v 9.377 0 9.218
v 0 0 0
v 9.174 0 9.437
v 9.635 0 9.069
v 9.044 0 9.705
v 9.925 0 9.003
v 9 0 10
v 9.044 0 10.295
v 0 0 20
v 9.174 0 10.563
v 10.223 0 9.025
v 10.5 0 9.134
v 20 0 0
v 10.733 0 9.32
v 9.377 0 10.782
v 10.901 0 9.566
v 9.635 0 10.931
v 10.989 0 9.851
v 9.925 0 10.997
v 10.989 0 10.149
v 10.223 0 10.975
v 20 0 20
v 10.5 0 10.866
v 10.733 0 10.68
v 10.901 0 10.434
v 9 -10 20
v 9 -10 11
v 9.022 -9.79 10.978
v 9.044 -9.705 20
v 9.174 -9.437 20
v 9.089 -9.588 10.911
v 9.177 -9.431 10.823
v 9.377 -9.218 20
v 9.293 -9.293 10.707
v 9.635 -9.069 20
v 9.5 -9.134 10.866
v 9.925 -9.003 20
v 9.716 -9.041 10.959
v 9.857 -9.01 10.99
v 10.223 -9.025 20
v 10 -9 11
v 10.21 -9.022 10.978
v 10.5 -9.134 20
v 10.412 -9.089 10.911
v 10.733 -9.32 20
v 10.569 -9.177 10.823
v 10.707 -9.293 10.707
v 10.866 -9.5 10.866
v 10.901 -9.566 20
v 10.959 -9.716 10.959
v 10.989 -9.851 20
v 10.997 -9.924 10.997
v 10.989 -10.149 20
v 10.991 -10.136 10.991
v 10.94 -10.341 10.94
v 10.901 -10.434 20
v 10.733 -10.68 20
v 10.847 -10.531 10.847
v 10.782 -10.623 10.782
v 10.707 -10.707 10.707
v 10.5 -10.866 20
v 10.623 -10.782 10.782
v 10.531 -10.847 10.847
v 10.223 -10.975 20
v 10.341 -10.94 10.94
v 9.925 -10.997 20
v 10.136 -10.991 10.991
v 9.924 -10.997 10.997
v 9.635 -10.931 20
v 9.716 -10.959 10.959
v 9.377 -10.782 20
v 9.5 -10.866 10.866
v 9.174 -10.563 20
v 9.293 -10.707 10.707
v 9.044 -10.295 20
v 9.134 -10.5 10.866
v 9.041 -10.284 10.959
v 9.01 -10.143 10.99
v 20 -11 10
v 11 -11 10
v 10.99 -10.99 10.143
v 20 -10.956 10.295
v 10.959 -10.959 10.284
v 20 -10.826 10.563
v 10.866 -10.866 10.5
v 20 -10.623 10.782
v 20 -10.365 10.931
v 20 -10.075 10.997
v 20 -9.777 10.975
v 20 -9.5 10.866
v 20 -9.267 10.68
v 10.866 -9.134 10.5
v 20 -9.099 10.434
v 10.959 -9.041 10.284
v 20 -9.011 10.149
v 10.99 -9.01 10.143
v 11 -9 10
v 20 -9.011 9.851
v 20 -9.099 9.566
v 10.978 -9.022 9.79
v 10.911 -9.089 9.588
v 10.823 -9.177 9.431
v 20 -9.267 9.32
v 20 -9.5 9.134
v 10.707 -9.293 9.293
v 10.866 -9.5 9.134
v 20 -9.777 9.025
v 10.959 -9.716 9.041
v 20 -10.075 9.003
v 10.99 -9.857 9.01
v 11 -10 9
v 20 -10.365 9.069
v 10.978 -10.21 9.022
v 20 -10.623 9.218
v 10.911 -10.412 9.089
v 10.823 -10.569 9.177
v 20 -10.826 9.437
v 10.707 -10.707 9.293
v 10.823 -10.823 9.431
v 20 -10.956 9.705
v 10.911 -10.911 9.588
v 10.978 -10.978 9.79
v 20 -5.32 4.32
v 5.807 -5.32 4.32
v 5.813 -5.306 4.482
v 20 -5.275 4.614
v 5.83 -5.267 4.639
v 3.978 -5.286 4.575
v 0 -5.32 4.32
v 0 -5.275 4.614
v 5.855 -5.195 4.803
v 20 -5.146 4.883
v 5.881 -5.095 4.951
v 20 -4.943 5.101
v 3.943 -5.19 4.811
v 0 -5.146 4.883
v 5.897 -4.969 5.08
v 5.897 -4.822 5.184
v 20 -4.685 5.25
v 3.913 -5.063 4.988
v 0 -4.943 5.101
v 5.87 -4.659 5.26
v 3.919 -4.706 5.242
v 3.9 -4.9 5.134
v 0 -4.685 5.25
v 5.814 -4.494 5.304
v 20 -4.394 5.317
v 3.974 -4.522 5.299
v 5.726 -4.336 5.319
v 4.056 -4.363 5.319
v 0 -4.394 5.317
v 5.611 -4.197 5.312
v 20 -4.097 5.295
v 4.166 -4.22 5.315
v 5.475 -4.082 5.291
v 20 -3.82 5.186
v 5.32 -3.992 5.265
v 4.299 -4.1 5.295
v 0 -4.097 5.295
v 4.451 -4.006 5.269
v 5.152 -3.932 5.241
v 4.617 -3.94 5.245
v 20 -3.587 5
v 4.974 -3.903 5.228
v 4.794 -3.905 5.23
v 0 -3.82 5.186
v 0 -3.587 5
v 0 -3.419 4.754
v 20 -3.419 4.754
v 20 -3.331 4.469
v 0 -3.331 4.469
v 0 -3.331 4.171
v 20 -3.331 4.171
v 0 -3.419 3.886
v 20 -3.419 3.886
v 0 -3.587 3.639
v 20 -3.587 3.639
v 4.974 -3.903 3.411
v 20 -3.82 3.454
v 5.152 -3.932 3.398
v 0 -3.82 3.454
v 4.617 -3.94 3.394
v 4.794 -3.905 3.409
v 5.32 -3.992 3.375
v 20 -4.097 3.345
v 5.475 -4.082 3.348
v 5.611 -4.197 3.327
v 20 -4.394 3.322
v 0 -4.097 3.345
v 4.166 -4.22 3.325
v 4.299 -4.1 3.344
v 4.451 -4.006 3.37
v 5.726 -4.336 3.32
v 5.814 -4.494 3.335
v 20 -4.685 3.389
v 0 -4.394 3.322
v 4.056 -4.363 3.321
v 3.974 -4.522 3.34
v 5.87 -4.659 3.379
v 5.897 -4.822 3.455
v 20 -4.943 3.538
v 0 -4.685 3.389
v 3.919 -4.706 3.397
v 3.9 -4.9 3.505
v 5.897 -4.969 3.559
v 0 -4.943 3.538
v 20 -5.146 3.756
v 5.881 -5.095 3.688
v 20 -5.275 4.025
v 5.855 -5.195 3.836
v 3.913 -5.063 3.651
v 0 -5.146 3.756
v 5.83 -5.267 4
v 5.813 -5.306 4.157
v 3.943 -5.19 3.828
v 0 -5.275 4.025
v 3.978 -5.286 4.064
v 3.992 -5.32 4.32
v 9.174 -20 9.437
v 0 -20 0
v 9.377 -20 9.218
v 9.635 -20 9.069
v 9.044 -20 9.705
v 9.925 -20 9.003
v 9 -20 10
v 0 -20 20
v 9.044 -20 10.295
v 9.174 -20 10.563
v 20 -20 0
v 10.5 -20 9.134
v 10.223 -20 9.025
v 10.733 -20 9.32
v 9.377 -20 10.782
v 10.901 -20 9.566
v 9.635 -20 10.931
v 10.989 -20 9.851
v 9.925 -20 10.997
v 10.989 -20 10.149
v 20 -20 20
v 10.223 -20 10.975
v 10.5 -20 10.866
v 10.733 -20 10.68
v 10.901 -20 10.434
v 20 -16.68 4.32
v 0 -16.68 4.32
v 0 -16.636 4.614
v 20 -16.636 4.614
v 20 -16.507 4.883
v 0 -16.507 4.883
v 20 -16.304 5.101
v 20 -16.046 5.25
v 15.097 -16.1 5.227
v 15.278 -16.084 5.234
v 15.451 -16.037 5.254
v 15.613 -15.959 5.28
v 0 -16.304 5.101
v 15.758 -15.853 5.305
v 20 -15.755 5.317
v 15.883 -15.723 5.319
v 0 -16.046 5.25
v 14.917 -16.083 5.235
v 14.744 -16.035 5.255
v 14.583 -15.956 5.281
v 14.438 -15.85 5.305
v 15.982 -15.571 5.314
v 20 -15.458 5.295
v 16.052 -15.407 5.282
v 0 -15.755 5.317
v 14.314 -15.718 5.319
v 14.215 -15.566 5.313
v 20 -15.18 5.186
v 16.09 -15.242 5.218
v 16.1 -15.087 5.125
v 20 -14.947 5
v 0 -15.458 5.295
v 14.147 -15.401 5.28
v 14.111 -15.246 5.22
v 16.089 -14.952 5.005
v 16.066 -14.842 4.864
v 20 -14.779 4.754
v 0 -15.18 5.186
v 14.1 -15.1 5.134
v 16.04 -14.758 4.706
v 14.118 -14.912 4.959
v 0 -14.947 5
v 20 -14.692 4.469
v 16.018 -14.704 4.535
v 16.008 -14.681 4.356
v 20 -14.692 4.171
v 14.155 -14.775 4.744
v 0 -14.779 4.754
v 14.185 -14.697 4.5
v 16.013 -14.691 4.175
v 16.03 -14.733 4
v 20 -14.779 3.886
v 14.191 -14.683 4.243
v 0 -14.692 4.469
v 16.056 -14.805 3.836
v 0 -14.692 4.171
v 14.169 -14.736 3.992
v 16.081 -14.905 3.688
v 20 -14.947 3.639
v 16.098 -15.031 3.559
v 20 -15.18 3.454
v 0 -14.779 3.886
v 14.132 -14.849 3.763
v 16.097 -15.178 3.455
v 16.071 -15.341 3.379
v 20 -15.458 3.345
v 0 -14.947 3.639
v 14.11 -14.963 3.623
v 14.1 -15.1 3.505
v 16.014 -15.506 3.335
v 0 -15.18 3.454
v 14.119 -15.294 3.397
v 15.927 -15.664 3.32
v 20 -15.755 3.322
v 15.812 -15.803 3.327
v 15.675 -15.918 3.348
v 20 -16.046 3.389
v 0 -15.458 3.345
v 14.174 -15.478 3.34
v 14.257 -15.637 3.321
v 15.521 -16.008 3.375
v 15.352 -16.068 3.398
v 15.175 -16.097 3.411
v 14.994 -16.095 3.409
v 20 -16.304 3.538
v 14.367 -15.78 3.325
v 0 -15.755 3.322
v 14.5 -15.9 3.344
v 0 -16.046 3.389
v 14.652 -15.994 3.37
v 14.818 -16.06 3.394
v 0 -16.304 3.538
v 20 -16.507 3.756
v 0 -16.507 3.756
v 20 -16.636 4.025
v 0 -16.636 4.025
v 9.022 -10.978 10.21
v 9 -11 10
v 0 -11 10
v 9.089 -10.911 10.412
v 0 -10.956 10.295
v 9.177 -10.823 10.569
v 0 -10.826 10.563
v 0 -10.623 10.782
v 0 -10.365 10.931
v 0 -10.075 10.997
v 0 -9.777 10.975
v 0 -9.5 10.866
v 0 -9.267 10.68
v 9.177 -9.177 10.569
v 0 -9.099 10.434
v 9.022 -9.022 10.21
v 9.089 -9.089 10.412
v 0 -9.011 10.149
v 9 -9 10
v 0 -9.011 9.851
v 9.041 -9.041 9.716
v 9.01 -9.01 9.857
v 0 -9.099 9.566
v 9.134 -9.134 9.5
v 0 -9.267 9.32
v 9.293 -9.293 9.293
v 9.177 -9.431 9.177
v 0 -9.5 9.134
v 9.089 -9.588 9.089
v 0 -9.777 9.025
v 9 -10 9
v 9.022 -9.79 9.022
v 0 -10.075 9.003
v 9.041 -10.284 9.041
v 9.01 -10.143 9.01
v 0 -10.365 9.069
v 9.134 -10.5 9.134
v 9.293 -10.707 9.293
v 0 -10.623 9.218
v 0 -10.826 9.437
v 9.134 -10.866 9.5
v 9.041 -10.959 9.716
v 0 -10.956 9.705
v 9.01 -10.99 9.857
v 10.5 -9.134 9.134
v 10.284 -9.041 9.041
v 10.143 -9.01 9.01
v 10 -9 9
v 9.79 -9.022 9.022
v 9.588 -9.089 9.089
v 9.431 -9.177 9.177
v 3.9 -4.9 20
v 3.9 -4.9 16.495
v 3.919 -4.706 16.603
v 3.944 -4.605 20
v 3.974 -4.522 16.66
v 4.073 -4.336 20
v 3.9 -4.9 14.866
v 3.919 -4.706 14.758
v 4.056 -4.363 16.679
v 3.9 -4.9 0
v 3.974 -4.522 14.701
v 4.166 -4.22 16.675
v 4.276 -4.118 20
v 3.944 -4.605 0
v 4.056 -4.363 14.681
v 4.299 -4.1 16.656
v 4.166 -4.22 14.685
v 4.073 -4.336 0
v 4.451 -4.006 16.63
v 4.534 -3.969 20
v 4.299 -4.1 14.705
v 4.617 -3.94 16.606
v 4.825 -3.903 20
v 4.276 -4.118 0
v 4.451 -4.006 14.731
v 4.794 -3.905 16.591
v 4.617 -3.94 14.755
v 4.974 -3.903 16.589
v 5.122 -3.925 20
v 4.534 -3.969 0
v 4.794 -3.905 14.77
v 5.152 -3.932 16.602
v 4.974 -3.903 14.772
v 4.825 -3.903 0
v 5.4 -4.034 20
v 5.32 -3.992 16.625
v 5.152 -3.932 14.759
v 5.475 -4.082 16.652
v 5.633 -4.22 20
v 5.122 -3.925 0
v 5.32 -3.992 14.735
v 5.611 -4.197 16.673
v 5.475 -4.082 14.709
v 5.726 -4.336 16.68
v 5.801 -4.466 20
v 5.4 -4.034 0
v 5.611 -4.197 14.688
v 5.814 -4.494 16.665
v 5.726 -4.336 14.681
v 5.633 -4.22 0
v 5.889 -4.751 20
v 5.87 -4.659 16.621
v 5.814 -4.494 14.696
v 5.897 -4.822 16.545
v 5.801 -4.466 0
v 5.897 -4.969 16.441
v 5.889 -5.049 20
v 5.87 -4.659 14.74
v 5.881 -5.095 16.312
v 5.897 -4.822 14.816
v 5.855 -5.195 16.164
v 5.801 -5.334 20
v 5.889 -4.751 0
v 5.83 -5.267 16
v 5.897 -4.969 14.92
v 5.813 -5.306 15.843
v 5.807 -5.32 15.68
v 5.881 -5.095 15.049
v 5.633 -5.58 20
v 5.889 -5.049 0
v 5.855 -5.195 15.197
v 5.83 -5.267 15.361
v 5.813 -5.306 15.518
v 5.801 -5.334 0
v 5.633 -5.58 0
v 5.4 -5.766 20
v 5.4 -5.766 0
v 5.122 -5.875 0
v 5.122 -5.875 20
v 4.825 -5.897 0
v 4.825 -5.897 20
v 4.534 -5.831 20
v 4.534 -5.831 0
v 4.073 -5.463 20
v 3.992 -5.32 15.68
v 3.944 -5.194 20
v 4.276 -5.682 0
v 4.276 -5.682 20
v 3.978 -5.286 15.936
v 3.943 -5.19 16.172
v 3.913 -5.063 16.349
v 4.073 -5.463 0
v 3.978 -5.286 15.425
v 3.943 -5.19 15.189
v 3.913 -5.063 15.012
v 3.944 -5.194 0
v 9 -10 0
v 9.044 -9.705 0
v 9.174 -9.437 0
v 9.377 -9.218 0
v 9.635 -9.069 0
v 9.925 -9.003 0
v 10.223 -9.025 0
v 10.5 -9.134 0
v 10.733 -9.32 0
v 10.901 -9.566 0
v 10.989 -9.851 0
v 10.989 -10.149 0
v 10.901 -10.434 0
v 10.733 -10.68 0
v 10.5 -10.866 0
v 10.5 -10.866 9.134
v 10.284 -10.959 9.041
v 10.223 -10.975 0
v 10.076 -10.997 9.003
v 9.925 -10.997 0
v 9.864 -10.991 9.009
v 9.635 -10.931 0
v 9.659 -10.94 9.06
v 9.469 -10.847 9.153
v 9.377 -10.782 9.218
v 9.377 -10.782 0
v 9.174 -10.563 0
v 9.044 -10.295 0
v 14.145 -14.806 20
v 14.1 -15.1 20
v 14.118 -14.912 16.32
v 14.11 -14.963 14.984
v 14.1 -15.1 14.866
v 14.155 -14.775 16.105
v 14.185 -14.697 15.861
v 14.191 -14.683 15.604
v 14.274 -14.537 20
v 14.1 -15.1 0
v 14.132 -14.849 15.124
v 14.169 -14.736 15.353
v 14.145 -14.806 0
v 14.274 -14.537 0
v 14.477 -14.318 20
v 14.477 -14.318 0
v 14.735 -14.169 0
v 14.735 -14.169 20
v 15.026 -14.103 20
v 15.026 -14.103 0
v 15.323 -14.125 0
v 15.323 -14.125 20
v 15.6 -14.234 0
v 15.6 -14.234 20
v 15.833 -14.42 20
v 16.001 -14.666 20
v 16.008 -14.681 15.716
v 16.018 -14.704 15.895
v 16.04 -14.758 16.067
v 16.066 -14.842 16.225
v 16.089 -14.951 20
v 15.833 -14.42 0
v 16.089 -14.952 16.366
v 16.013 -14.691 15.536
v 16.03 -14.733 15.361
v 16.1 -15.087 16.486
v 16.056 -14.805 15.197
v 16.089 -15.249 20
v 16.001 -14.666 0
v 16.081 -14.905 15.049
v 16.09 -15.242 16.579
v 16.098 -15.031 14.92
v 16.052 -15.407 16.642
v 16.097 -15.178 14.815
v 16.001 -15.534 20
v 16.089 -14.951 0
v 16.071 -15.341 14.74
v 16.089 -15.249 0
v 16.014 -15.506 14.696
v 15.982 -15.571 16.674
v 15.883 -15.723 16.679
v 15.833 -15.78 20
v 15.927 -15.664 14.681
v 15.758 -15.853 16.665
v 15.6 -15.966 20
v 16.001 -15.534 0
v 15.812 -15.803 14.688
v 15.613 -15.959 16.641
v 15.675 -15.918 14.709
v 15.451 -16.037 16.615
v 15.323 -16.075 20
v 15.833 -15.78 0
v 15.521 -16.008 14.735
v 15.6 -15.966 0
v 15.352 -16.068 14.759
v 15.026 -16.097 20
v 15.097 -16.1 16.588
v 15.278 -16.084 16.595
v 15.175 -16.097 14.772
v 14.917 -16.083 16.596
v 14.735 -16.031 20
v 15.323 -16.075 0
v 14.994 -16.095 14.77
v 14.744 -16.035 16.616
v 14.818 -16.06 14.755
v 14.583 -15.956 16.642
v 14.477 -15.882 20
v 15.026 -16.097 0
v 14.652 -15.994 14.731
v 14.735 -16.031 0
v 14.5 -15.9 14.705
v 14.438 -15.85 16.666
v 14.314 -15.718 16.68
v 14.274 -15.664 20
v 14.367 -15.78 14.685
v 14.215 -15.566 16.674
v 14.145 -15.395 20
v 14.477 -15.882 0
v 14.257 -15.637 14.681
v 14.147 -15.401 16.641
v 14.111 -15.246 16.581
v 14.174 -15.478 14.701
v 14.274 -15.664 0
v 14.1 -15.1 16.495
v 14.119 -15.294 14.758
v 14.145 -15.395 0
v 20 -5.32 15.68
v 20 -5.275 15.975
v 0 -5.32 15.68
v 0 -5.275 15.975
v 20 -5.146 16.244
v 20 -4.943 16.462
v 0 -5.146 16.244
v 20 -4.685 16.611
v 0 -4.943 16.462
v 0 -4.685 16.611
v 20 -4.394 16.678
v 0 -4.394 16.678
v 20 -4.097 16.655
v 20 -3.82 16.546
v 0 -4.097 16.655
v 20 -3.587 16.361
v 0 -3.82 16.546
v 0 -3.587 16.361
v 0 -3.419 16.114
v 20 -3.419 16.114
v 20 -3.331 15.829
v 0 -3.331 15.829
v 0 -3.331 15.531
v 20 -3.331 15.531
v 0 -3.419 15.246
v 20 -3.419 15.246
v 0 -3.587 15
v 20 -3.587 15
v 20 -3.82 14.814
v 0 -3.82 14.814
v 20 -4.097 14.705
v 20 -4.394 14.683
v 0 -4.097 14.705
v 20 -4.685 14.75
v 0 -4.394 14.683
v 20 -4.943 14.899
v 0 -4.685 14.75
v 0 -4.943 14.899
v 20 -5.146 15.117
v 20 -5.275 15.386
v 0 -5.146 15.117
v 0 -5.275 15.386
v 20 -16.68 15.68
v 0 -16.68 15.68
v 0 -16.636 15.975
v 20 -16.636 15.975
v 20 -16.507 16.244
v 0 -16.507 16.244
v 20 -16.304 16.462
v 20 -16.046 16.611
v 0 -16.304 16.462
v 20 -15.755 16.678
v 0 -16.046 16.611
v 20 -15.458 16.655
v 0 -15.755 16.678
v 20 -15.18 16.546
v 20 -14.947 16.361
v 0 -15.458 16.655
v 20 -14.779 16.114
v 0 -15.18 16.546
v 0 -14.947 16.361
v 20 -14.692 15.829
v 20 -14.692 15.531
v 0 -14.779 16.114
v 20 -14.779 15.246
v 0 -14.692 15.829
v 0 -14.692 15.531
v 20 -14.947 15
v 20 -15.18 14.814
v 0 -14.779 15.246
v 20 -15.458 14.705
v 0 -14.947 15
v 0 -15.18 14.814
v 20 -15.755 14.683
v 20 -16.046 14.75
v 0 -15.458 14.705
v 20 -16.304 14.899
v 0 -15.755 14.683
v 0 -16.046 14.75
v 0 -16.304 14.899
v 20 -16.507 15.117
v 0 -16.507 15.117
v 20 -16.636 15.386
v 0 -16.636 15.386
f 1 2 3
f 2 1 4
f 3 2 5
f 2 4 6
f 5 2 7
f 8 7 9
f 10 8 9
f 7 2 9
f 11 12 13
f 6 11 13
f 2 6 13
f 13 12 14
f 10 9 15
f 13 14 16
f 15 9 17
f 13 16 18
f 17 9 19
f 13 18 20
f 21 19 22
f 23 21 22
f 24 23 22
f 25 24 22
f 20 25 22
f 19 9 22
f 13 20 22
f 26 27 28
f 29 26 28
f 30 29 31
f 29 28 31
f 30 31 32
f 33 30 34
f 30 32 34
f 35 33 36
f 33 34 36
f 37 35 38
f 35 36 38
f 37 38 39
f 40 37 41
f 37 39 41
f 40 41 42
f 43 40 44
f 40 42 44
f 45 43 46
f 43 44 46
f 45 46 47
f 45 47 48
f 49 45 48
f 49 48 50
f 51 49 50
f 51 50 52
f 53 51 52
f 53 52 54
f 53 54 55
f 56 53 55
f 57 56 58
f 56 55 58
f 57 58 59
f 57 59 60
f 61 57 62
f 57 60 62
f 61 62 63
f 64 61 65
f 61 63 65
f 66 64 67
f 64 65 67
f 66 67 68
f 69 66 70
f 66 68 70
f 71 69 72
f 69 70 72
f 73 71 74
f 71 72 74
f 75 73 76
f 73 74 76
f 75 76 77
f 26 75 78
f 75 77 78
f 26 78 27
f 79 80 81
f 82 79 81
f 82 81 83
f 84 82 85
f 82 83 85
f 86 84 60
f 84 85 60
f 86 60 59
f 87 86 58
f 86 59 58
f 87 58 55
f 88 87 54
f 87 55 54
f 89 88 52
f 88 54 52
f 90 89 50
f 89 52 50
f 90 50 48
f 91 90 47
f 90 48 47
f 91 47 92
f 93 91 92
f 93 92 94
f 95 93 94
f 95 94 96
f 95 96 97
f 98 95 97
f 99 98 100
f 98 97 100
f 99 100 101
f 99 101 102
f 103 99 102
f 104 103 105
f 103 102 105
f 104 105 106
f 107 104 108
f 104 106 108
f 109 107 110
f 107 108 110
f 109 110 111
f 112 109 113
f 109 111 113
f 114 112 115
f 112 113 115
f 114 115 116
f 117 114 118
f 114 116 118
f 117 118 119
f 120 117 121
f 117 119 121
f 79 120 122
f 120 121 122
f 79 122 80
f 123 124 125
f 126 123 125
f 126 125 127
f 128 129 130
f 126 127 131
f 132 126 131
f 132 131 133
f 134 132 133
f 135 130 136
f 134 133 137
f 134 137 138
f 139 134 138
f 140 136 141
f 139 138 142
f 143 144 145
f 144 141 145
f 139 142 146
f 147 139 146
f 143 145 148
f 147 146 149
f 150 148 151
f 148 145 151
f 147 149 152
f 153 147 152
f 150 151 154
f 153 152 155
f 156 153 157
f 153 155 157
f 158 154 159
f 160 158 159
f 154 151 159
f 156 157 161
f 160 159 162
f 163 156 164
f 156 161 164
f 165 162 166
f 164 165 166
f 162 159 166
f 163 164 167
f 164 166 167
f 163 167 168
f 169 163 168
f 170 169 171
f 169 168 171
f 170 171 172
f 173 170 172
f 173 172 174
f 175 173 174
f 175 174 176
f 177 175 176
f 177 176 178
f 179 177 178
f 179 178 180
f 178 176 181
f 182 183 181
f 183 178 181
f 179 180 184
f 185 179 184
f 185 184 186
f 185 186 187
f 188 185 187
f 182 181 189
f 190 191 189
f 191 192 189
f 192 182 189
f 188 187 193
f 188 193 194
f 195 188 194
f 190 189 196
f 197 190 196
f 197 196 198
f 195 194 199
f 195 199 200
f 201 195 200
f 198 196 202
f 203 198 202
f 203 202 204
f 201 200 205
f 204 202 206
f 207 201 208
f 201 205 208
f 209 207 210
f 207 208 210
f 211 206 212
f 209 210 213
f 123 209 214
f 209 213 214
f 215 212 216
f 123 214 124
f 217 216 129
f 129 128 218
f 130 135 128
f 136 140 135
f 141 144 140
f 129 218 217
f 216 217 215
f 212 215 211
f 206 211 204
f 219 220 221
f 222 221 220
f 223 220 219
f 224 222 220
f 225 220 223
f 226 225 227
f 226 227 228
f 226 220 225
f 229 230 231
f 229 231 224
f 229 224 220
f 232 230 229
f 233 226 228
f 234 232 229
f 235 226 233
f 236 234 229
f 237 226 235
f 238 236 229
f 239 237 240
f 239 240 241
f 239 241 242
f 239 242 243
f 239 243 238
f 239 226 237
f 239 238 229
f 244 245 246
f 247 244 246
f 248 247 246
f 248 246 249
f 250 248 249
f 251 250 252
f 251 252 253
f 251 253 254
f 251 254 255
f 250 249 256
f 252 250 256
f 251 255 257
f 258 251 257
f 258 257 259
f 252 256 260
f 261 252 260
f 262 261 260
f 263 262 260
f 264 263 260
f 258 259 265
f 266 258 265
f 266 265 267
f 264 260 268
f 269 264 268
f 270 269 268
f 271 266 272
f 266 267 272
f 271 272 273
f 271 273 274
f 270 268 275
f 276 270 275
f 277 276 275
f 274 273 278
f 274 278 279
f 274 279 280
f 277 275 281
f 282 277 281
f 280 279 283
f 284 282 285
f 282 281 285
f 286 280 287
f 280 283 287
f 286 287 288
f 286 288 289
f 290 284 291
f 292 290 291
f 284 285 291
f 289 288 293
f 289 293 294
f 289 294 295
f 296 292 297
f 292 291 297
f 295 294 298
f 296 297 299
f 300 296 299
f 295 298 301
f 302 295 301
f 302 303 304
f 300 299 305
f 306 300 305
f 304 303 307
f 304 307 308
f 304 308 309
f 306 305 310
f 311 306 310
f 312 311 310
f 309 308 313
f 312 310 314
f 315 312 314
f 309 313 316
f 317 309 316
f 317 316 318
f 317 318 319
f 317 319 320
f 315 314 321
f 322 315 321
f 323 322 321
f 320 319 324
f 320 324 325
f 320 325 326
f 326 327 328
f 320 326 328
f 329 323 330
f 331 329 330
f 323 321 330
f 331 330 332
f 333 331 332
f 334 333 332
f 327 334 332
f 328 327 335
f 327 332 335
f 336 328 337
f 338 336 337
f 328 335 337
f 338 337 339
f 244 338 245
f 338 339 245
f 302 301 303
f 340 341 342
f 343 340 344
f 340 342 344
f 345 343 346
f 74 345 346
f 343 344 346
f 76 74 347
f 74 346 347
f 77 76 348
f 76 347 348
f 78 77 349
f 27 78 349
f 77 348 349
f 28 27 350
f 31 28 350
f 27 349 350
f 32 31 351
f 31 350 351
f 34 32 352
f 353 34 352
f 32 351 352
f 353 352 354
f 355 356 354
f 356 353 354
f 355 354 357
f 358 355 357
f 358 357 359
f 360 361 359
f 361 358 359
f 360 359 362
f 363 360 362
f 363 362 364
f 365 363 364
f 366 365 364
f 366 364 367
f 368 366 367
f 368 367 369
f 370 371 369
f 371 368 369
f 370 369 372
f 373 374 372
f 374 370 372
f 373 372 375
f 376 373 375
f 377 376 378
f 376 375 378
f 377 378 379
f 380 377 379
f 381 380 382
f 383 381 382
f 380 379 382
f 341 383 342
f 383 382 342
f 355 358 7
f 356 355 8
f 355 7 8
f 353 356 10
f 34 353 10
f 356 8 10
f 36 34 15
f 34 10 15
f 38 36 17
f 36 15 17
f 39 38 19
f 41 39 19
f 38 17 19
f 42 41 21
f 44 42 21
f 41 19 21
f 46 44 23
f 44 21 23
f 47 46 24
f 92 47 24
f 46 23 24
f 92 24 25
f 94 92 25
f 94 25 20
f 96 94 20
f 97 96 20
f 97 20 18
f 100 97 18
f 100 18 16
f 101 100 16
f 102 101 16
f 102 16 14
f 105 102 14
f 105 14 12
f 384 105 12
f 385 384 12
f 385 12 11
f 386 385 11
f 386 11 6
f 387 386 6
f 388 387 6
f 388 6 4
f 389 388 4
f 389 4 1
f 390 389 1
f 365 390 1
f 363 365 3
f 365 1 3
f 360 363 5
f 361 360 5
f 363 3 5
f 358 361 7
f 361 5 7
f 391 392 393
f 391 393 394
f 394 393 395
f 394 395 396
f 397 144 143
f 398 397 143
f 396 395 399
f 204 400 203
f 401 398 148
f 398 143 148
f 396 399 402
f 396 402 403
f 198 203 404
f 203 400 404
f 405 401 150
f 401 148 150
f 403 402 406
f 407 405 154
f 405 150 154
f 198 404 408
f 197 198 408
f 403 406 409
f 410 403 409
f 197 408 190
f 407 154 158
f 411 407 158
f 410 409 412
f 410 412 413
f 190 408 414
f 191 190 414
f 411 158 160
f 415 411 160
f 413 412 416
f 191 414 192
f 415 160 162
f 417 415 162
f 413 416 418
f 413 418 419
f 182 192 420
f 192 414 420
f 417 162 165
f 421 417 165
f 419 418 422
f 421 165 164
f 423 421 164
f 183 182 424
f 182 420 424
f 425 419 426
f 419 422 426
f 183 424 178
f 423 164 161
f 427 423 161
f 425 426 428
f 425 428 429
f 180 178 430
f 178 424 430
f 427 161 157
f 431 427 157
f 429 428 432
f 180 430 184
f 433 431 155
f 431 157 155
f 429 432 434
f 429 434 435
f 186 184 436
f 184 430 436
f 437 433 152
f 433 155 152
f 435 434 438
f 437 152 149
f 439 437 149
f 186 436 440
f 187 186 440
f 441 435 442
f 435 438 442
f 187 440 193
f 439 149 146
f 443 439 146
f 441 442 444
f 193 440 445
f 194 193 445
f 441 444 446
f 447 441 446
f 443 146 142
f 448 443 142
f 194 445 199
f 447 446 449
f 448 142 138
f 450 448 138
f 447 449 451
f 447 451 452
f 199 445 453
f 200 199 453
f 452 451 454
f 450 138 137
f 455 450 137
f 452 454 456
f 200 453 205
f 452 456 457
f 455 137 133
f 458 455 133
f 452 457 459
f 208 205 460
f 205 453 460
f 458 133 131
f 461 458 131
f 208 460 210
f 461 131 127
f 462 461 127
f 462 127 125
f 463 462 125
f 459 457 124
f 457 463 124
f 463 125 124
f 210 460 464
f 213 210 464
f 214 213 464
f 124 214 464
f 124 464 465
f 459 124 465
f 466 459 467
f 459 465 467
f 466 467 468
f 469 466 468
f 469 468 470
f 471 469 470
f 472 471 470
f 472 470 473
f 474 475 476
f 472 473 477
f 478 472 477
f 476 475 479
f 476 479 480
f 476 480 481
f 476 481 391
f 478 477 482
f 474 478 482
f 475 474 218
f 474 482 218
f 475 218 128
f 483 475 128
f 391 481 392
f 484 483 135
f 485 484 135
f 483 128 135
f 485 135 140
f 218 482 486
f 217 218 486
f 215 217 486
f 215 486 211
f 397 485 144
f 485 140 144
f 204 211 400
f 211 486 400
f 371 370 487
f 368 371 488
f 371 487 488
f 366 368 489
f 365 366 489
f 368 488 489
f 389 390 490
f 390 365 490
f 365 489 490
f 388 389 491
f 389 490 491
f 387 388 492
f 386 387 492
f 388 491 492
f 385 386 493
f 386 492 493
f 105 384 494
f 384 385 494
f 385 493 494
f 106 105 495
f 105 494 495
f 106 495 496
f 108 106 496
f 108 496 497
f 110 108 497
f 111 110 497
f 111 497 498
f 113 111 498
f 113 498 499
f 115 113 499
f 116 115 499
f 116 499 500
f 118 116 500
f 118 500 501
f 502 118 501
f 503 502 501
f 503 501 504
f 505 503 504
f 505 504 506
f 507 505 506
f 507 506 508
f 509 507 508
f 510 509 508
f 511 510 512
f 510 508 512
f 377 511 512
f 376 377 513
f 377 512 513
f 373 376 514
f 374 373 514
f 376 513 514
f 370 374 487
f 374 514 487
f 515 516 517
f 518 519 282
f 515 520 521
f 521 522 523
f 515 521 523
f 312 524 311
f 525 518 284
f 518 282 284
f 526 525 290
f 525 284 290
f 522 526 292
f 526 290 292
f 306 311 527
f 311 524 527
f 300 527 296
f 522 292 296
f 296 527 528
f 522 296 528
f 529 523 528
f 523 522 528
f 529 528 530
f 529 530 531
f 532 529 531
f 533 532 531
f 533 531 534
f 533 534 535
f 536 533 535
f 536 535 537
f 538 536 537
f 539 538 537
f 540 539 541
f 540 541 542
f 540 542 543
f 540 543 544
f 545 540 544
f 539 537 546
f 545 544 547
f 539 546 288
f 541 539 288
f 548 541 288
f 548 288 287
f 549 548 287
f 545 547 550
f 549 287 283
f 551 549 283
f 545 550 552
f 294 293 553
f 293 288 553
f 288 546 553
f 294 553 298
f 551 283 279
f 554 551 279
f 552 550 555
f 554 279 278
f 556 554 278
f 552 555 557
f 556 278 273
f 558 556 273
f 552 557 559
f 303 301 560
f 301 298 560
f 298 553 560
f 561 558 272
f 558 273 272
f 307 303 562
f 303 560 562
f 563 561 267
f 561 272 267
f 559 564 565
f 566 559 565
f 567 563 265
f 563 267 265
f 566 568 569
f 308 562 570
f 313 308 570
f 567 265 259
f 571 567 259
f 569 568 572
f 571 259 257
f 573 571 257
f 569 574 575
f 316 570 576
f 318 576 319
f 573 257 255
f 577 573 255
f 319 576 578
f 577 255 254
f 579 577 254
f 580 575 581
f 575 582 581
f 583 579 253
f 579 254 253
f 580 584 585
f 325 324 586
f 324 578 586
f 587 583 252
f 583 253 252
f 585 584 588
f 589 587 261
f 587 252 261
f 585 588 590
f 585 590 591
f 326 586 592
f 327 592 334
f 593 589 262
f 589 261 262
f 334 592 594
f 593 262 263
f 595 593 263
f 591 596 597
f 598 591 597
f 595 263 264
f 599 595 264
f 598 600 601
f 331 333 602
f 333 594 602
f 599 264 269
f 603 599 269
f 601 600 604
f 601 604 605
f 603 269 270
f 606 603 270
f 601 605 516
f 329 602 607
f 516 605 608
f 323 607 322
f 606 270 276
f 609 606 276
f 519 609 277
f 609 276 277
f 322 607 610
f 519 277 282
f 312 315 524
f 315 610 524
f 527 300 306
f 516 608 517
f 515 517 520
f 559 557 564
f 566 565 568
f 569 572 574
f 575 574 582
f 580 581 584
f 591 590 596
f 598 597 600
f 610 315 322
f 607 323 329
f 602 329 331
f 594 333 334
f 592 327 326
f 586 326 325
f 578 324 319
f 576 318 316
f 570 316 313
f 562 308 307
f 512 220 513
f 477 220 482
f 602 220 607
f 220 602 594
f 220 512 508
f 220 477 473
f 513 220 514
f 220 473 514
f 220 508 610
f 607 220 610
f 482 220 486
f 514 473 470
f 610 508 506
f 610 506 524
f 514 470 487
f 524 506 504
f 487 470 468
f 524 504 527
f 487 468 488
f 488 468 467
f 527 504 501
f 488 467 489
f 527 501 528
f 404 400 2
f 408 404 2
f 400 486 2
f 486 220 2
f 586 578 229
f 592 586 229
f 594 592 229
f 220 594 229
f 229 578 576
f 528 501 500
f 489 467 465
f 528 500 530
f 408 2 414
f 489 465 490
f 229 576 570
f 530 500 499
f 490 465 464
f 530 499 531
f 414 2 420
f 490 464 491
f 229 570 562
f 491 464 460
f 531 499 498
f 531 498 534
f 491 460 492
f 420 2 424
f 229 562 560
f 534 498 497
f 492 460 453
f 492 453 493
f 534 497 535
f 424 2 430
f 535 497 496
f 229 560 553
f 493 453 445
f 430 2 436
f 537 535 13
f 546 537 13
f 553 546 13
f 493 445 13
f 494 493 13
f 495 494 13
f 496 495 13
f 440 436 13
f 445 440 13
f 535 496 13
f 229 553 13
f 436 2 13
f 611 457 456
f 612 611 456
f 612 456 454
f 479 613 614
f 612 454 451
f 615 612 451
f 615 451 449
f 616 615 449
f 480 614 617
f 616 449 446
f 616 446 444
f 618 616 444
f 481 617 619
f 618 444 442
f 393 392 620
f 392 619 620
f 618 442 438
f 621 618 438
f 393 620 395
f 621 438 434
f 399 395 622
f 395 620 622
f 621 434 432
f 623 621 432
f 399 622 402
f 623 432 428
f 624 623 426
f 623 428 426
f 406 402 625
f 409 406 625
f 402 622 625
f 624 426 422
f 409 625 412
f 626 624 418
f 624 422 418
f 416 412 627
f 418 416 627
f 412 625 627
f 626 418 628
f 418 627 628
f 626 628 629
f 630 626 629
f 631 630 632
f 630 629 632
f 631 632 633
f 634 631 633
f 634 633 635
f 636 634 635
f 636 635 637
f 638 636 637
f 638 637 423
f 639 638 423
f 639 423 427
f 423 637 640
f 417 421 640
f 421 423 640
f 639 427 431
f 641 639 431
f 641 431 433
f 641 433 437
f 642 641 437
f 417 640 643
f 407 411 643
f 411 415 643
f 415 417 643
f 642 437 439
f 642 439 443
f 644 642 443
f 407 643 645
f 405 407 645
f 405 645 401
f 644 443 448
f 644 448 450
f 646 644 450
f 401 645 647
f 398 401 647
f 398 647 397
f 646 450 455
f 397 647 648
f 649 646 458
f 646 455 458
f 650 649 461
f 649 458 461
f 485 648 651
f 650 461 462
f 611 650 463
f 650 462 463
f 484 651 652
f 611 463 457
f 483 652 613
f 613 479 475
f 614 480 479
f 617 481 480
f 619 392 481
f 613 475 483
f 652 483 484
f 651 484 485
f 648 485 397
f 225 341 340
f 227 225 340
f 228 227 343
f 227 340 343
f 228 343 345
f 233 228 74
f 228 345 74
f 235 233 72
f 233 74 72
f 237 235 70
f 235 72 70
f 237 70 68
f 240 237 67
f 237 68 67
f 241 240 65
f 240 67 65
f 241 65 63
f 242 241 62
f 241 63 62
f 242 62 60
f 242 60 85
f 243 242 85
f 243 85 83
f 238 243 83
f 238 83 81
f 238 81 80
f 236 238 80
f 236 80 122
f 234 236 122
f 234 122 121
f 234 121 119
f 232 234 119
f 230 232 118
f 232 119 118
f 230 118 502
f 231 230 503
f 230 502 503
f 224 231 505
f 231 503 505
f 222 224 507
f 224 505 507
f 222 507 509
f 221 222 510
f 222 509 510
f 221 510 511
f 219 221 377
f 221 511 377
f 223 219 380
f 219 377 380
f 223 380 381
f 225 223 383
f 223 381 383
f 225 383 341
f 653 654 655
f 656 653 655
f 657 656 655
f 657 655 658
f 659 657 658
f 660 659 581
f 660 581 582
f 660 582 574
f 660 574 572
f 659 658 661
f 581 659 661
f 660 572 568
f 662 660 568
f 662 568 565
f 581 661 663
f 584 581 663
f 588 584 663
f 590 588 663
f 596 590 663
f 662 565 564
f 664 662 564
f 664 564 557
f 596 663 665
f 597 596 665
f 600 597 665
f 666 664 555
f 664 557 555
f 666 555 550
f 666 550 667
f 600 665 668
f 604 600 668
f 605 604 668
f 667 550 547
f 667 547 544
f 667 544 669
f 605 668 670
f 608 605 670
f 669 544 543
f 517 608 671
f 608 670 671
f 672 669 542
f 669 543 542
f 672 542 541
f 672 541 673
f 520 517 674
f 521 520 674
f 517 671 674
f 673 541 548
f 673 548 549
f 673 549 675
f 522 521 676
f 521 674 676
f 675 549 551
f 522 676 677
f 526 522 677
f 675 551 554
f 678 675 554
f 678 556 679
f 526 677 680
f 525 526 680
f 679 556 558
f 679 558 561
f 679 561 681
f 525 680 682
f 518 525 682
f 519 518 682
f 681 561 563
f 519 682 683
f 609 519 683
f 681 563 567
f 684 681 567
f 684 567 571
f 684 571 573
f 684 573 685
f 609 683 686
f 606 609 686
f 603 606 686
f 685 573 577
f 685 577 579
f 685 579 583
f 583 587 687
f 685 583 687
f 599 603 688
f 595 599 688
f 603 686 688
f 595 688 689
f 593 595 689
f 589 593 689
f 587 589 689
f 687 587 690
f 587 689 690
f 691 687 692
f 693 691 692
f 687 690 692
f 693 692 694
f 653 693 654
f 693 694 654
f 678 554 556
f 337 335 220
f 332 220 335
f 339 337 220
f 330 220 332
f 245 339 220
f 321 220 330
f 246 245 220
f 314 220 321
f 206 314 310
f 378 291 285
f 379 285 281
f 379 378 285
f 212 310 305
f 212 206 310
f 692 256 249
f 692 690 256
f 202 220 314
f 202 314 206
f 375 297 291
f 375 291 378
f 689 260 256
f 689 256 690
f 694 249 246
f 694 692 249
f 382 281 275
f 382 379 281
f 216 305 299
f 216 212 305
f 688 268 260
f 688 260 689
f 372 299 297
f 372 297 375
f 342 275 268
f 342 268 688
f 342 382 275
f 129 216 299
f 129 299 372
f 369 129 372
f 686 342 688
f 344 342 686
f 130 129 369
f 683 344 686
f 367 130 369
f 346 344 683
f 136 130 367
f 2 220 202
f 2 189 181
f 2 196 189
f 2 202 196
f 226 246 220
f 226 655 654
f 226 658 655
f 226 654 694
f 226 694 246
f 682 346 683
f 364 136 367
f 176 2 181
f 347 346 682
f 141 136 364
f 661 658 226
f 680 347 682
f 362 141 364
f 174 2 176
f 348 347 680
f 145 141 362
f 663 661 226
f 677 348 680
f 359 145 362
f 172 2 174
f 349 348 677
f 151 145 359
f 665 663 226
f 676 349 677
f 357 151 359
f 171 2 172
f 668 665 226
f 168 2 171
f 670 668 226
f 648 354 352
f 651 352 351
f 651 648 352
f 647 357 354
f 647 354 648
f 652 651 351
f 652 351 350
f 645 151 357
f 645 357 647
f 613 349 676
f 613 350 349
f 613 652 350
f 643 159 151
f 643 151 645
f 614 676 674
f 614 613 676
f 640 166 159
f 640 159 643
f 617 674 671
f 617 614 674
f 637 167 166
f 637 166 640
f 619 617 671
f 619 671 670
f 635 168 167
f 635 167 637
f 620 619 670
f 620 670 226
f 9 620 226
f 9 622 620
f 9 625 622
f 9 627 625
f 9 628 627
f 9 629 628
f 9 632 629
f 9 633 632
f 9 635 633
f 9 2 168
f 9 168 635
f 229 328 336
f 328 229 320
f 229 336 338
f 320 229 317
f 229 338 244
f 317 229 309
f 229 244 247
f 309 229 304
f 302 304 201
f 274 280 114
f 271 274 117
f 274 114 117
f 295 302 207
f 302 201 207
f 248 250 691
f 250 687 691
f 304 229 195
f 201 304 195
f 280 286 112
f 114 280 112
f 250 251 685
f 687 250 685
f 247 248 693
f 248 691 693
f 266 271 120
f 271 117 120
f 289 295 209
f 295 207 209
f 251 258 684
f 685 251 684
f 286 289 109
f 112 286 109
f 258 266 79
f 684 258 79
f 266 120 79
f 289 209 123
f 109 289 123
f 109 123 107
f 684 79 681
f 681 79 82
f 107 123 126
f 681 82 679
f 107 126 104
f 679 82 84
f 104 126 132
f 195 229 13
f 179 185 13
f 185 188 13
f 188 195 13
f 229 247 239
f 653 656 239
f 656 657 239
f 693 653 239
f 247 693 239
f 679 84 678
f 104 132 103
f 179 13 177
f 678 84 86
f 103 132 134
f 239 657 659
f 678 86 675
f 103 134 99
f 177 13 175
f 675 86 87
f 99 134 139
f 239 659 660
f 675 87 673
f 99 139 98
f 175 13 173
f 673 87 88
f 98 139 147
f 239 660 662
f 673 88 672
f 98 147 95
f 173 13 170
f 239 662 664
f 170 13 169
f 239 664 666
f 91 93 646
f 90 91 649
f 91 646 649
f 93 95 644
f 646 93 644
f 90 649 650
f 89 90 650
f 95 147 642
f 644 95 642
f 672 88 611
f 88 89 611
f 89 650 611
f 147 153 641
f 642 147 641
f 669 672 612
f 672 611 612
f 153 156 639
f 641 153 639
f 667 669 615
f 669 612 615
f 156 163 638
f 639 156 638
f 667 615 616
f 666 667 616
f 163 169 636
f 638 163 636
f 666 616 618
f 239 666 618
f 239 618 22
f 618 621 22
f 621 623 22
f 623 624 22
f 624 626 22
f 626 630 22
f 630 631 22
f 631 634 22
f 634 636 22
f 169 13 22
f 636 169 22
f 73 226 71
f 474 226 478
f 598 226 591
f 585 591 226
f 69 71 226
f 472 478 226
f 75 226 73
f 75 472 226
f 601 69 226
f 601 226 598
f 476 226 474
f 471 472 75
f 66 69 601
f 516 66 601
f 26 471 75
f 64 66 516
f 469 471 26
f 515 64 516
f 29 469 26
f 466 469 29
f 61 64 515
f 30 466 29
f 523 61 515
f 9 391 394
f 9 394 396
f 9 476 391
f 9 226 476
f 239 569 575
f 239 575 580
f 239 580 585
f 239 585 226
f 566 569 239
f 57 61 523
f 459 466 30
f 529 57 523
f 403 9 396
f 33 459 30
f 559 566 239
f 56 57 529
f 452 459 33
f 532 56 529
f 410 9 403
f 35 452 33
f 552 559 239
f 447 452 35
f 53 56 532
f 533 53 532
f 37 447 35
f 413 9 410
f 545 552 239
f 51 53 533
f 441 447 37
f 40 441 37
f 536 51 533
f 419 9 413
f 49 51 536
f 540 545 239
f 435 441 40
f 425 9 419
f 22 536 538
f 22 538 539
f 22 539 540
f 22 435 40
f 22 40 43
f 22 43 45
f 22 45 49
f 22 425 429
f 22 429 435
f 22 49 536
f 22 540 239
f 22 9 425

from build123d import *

# Parameters (mm, degrees)
F0_W     = 20
F0_H     = 20
F1_DEPTH = 20
F3_D     = 2
F5_D     = 2
F7_D     = 2


with BuildPart() as f1:
    # F0 (on Front) → F1 (new body)
    with BuildSketch(Plane.XZ):
        with Locations((10, 10)):
            Rectangle(F0_W, F0_H)
    extrude(amount=F1_DEPTH)

    # F3 (through all)
    with Locations(Plane.XZ.offset(20)):
        with Locations((10, 10)):
            Hole(F3_D / 2)

    # F5 (through all)
    with Locations(Plane.XY.offset(20)):
        with Locations((4.899733, -4.899733), (10, -10), (15.100267, -15.100267)):
            Hole(F5_D / 2)

    # F7 (through all)
    with Locations(Plane.YZ.offset(20)):
        with Locations((-10, 10), (-15.680383, 15.680383), (-15.680383, 4.319617), (-4.319617, 4.319617), (-4.319617, 15.680383)):
            Hole(F7_D / 2)


solid = f1.part
